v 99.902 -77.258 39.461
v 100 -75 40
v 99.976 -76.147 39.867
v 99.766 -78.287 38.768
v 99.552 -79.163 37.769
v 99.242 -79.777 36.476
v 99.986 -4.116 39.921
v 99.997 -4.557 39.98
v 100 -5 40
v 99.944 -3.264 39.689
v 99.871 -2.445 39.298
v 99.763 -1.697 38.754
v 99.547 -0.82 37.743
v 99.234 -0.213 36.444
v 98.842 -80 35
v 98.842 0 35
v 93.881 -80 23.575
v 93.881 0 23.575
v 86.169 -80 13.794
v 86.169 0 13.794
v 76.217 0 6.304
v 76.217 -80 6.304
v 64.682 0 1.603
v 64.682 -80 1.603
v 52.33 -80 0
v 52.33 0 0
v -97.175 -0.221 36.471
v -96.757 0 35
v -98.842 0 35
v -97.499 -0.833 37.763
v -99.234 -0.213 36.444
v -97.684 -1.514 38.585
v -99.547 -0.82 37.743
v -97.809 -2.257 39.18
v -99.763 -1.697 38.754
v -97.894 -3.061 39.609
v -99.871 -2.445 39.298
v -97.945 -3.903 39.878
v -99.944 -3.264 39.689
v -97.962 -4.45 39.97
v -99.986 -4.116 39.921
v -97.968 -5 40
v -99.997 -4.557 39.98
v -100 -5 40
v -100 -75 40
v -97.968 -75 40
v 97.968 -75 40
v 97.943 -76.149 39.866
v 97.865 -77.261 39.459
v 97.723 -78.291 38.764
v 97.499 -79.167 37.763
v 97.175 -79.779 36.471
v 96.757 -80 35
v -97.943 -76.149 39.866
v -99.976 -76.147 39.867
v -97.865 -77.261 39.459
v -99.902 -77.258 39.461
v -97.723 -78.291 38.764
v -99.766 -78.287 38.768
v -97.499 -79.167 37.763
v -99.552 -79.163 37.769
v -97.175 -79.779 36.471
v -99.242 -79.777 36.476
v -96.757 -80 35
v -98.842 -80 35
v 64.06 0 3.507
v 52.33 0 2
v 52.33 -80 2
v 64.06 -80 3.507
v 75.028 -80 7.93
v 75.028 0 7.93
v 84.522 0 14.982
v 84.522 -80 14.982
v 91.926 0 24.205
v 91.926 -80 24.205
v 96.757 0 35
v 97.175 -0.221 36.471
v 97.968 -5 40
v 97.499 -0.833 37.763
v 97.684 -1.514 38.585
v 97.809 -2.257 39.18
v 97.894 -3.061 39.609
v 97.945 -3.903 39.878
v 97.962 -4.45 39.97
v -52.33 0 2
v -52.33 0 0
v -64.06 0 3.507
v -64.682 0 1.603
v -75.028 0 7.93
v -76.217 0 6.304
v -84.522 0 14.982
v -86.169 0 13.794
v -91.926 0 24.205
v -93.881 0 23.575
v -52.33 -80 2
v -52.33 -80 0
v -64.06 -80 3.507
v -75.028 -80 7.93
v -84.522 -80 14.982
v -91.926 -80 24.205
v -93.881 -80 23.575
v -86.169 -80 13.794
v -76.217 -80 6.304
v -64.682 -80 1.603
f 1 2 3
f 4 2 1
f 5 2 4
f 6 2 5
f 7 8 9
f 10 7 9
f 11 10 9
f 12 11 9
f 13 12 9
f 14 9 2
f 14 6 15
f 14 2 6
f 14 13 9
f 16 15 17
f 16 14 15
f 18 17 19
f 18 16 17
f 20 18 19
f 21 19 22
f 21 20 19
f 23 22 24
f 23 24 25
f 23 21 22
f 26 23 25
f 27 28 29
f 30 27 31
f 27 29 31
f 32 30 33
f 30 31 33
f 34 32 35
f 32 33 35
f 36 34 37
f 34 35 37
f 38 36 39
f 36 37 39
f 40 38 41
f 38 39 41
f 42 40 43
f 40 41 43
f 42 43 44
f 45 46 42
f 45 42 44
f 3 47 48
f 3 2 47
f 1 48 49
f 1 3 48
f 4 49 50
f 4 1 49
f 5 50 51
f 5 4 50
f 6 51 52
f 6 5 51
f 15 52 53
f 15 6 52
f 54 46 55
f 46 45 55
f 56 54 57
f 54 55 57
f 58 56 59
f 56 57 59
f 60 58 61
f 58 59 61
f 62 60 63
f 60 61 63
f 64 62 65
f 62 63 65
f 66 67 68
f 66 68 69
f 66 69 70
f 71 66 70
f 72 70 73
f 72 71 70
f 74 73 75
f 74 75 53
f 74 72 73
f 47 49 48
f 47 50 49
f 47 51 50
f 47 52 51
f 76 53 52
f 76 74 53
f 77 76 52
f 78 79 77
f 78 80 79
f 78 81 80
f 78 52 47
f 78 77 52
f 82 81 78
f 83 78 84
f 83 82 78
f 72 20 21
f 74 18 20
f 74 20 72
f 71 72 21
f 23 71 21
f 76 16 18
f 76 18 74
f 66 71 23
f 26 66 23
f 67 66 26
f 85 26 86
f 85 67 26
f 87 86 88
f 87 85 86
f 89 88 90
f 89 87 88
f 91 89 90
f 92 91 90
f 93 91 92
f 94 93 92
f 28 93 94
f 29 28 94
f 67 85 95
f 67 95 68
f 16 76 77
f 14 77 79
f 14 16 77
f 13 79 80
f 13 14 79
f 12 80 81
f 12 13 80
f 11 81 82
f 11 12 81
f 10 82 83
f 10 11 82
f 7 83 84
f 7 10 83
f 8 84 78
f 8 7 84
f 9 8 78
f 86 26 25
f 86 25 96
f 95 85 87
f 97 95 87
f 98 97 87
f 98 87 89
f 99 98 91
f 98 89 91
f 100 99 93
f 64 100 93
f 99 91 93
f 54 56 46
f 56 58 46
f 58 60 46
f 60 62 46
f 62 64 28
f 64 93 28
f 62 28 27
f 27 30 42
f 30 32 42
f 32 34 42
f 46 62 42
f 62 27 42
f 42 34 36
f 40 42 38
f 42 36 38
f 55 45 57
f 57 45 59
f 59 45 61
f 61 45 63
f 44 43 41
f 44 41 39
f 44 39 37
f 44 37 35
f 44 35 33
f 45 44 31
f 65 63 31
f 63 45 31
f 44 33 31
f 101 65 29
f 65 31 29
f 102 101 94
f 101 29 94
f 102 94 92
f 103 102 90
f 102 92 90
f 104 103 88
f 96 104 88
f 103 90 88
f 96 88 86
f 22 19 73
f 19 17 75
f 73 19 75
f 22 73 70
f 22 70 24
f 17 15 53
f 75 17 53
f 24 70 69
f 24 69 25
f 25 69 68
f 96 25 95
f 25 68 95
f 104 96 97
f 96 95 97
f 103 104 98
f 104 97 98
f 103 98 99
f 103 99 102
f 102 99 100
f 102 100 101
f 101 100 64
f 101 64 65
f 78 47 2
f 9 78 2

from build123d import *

# Parameters (mm, degrees)
F1_DEPTH = 80
F3_R     = 5


with BuildPart() as f1:
    # F0 (on Front) → F1 (new body)
    with BuildSketch(Plane.XZ):
        with BuildLine():
            Line((-52.3298562962, 0), (0, 0))
            Line((0, 0), (0, 2))
            Line((0, 2), (-52.3298562962, 2))
            ThreePointArc((-52.3298562962, 2), (-82.0233760889, 12.7436715119), (-97.9677842805, 40))
            Line((-97.9677842805, 40), (-100, 40))
            ThreePointArc((-100, 40), (-83.4443328334, 11.3247433143), (-52.3298562962, 0))
        make_face()
    extrude(amount=F1_DEPTH)

    # F2: F1 across face


with BuildPart() as f1_1:
    add(f1.part)
    add(f1.part.mirror(Plane(origin=(0, -40, 1), x_dir=(0, 1, 0), z_dir=(1, 0, 0))))

    # F3
    f3_edges = [f1_1.edges().sort_by_distance(p)[0] for p in [
        (-98.983892, -80, 40),
        (-98.983892, 0, 40),
        (98.983892, -80, 40),
        (98.983892, 0, 40),
    ]]
    fillet(f3_edges, radius=F3_R)


solid = f1_1.part
